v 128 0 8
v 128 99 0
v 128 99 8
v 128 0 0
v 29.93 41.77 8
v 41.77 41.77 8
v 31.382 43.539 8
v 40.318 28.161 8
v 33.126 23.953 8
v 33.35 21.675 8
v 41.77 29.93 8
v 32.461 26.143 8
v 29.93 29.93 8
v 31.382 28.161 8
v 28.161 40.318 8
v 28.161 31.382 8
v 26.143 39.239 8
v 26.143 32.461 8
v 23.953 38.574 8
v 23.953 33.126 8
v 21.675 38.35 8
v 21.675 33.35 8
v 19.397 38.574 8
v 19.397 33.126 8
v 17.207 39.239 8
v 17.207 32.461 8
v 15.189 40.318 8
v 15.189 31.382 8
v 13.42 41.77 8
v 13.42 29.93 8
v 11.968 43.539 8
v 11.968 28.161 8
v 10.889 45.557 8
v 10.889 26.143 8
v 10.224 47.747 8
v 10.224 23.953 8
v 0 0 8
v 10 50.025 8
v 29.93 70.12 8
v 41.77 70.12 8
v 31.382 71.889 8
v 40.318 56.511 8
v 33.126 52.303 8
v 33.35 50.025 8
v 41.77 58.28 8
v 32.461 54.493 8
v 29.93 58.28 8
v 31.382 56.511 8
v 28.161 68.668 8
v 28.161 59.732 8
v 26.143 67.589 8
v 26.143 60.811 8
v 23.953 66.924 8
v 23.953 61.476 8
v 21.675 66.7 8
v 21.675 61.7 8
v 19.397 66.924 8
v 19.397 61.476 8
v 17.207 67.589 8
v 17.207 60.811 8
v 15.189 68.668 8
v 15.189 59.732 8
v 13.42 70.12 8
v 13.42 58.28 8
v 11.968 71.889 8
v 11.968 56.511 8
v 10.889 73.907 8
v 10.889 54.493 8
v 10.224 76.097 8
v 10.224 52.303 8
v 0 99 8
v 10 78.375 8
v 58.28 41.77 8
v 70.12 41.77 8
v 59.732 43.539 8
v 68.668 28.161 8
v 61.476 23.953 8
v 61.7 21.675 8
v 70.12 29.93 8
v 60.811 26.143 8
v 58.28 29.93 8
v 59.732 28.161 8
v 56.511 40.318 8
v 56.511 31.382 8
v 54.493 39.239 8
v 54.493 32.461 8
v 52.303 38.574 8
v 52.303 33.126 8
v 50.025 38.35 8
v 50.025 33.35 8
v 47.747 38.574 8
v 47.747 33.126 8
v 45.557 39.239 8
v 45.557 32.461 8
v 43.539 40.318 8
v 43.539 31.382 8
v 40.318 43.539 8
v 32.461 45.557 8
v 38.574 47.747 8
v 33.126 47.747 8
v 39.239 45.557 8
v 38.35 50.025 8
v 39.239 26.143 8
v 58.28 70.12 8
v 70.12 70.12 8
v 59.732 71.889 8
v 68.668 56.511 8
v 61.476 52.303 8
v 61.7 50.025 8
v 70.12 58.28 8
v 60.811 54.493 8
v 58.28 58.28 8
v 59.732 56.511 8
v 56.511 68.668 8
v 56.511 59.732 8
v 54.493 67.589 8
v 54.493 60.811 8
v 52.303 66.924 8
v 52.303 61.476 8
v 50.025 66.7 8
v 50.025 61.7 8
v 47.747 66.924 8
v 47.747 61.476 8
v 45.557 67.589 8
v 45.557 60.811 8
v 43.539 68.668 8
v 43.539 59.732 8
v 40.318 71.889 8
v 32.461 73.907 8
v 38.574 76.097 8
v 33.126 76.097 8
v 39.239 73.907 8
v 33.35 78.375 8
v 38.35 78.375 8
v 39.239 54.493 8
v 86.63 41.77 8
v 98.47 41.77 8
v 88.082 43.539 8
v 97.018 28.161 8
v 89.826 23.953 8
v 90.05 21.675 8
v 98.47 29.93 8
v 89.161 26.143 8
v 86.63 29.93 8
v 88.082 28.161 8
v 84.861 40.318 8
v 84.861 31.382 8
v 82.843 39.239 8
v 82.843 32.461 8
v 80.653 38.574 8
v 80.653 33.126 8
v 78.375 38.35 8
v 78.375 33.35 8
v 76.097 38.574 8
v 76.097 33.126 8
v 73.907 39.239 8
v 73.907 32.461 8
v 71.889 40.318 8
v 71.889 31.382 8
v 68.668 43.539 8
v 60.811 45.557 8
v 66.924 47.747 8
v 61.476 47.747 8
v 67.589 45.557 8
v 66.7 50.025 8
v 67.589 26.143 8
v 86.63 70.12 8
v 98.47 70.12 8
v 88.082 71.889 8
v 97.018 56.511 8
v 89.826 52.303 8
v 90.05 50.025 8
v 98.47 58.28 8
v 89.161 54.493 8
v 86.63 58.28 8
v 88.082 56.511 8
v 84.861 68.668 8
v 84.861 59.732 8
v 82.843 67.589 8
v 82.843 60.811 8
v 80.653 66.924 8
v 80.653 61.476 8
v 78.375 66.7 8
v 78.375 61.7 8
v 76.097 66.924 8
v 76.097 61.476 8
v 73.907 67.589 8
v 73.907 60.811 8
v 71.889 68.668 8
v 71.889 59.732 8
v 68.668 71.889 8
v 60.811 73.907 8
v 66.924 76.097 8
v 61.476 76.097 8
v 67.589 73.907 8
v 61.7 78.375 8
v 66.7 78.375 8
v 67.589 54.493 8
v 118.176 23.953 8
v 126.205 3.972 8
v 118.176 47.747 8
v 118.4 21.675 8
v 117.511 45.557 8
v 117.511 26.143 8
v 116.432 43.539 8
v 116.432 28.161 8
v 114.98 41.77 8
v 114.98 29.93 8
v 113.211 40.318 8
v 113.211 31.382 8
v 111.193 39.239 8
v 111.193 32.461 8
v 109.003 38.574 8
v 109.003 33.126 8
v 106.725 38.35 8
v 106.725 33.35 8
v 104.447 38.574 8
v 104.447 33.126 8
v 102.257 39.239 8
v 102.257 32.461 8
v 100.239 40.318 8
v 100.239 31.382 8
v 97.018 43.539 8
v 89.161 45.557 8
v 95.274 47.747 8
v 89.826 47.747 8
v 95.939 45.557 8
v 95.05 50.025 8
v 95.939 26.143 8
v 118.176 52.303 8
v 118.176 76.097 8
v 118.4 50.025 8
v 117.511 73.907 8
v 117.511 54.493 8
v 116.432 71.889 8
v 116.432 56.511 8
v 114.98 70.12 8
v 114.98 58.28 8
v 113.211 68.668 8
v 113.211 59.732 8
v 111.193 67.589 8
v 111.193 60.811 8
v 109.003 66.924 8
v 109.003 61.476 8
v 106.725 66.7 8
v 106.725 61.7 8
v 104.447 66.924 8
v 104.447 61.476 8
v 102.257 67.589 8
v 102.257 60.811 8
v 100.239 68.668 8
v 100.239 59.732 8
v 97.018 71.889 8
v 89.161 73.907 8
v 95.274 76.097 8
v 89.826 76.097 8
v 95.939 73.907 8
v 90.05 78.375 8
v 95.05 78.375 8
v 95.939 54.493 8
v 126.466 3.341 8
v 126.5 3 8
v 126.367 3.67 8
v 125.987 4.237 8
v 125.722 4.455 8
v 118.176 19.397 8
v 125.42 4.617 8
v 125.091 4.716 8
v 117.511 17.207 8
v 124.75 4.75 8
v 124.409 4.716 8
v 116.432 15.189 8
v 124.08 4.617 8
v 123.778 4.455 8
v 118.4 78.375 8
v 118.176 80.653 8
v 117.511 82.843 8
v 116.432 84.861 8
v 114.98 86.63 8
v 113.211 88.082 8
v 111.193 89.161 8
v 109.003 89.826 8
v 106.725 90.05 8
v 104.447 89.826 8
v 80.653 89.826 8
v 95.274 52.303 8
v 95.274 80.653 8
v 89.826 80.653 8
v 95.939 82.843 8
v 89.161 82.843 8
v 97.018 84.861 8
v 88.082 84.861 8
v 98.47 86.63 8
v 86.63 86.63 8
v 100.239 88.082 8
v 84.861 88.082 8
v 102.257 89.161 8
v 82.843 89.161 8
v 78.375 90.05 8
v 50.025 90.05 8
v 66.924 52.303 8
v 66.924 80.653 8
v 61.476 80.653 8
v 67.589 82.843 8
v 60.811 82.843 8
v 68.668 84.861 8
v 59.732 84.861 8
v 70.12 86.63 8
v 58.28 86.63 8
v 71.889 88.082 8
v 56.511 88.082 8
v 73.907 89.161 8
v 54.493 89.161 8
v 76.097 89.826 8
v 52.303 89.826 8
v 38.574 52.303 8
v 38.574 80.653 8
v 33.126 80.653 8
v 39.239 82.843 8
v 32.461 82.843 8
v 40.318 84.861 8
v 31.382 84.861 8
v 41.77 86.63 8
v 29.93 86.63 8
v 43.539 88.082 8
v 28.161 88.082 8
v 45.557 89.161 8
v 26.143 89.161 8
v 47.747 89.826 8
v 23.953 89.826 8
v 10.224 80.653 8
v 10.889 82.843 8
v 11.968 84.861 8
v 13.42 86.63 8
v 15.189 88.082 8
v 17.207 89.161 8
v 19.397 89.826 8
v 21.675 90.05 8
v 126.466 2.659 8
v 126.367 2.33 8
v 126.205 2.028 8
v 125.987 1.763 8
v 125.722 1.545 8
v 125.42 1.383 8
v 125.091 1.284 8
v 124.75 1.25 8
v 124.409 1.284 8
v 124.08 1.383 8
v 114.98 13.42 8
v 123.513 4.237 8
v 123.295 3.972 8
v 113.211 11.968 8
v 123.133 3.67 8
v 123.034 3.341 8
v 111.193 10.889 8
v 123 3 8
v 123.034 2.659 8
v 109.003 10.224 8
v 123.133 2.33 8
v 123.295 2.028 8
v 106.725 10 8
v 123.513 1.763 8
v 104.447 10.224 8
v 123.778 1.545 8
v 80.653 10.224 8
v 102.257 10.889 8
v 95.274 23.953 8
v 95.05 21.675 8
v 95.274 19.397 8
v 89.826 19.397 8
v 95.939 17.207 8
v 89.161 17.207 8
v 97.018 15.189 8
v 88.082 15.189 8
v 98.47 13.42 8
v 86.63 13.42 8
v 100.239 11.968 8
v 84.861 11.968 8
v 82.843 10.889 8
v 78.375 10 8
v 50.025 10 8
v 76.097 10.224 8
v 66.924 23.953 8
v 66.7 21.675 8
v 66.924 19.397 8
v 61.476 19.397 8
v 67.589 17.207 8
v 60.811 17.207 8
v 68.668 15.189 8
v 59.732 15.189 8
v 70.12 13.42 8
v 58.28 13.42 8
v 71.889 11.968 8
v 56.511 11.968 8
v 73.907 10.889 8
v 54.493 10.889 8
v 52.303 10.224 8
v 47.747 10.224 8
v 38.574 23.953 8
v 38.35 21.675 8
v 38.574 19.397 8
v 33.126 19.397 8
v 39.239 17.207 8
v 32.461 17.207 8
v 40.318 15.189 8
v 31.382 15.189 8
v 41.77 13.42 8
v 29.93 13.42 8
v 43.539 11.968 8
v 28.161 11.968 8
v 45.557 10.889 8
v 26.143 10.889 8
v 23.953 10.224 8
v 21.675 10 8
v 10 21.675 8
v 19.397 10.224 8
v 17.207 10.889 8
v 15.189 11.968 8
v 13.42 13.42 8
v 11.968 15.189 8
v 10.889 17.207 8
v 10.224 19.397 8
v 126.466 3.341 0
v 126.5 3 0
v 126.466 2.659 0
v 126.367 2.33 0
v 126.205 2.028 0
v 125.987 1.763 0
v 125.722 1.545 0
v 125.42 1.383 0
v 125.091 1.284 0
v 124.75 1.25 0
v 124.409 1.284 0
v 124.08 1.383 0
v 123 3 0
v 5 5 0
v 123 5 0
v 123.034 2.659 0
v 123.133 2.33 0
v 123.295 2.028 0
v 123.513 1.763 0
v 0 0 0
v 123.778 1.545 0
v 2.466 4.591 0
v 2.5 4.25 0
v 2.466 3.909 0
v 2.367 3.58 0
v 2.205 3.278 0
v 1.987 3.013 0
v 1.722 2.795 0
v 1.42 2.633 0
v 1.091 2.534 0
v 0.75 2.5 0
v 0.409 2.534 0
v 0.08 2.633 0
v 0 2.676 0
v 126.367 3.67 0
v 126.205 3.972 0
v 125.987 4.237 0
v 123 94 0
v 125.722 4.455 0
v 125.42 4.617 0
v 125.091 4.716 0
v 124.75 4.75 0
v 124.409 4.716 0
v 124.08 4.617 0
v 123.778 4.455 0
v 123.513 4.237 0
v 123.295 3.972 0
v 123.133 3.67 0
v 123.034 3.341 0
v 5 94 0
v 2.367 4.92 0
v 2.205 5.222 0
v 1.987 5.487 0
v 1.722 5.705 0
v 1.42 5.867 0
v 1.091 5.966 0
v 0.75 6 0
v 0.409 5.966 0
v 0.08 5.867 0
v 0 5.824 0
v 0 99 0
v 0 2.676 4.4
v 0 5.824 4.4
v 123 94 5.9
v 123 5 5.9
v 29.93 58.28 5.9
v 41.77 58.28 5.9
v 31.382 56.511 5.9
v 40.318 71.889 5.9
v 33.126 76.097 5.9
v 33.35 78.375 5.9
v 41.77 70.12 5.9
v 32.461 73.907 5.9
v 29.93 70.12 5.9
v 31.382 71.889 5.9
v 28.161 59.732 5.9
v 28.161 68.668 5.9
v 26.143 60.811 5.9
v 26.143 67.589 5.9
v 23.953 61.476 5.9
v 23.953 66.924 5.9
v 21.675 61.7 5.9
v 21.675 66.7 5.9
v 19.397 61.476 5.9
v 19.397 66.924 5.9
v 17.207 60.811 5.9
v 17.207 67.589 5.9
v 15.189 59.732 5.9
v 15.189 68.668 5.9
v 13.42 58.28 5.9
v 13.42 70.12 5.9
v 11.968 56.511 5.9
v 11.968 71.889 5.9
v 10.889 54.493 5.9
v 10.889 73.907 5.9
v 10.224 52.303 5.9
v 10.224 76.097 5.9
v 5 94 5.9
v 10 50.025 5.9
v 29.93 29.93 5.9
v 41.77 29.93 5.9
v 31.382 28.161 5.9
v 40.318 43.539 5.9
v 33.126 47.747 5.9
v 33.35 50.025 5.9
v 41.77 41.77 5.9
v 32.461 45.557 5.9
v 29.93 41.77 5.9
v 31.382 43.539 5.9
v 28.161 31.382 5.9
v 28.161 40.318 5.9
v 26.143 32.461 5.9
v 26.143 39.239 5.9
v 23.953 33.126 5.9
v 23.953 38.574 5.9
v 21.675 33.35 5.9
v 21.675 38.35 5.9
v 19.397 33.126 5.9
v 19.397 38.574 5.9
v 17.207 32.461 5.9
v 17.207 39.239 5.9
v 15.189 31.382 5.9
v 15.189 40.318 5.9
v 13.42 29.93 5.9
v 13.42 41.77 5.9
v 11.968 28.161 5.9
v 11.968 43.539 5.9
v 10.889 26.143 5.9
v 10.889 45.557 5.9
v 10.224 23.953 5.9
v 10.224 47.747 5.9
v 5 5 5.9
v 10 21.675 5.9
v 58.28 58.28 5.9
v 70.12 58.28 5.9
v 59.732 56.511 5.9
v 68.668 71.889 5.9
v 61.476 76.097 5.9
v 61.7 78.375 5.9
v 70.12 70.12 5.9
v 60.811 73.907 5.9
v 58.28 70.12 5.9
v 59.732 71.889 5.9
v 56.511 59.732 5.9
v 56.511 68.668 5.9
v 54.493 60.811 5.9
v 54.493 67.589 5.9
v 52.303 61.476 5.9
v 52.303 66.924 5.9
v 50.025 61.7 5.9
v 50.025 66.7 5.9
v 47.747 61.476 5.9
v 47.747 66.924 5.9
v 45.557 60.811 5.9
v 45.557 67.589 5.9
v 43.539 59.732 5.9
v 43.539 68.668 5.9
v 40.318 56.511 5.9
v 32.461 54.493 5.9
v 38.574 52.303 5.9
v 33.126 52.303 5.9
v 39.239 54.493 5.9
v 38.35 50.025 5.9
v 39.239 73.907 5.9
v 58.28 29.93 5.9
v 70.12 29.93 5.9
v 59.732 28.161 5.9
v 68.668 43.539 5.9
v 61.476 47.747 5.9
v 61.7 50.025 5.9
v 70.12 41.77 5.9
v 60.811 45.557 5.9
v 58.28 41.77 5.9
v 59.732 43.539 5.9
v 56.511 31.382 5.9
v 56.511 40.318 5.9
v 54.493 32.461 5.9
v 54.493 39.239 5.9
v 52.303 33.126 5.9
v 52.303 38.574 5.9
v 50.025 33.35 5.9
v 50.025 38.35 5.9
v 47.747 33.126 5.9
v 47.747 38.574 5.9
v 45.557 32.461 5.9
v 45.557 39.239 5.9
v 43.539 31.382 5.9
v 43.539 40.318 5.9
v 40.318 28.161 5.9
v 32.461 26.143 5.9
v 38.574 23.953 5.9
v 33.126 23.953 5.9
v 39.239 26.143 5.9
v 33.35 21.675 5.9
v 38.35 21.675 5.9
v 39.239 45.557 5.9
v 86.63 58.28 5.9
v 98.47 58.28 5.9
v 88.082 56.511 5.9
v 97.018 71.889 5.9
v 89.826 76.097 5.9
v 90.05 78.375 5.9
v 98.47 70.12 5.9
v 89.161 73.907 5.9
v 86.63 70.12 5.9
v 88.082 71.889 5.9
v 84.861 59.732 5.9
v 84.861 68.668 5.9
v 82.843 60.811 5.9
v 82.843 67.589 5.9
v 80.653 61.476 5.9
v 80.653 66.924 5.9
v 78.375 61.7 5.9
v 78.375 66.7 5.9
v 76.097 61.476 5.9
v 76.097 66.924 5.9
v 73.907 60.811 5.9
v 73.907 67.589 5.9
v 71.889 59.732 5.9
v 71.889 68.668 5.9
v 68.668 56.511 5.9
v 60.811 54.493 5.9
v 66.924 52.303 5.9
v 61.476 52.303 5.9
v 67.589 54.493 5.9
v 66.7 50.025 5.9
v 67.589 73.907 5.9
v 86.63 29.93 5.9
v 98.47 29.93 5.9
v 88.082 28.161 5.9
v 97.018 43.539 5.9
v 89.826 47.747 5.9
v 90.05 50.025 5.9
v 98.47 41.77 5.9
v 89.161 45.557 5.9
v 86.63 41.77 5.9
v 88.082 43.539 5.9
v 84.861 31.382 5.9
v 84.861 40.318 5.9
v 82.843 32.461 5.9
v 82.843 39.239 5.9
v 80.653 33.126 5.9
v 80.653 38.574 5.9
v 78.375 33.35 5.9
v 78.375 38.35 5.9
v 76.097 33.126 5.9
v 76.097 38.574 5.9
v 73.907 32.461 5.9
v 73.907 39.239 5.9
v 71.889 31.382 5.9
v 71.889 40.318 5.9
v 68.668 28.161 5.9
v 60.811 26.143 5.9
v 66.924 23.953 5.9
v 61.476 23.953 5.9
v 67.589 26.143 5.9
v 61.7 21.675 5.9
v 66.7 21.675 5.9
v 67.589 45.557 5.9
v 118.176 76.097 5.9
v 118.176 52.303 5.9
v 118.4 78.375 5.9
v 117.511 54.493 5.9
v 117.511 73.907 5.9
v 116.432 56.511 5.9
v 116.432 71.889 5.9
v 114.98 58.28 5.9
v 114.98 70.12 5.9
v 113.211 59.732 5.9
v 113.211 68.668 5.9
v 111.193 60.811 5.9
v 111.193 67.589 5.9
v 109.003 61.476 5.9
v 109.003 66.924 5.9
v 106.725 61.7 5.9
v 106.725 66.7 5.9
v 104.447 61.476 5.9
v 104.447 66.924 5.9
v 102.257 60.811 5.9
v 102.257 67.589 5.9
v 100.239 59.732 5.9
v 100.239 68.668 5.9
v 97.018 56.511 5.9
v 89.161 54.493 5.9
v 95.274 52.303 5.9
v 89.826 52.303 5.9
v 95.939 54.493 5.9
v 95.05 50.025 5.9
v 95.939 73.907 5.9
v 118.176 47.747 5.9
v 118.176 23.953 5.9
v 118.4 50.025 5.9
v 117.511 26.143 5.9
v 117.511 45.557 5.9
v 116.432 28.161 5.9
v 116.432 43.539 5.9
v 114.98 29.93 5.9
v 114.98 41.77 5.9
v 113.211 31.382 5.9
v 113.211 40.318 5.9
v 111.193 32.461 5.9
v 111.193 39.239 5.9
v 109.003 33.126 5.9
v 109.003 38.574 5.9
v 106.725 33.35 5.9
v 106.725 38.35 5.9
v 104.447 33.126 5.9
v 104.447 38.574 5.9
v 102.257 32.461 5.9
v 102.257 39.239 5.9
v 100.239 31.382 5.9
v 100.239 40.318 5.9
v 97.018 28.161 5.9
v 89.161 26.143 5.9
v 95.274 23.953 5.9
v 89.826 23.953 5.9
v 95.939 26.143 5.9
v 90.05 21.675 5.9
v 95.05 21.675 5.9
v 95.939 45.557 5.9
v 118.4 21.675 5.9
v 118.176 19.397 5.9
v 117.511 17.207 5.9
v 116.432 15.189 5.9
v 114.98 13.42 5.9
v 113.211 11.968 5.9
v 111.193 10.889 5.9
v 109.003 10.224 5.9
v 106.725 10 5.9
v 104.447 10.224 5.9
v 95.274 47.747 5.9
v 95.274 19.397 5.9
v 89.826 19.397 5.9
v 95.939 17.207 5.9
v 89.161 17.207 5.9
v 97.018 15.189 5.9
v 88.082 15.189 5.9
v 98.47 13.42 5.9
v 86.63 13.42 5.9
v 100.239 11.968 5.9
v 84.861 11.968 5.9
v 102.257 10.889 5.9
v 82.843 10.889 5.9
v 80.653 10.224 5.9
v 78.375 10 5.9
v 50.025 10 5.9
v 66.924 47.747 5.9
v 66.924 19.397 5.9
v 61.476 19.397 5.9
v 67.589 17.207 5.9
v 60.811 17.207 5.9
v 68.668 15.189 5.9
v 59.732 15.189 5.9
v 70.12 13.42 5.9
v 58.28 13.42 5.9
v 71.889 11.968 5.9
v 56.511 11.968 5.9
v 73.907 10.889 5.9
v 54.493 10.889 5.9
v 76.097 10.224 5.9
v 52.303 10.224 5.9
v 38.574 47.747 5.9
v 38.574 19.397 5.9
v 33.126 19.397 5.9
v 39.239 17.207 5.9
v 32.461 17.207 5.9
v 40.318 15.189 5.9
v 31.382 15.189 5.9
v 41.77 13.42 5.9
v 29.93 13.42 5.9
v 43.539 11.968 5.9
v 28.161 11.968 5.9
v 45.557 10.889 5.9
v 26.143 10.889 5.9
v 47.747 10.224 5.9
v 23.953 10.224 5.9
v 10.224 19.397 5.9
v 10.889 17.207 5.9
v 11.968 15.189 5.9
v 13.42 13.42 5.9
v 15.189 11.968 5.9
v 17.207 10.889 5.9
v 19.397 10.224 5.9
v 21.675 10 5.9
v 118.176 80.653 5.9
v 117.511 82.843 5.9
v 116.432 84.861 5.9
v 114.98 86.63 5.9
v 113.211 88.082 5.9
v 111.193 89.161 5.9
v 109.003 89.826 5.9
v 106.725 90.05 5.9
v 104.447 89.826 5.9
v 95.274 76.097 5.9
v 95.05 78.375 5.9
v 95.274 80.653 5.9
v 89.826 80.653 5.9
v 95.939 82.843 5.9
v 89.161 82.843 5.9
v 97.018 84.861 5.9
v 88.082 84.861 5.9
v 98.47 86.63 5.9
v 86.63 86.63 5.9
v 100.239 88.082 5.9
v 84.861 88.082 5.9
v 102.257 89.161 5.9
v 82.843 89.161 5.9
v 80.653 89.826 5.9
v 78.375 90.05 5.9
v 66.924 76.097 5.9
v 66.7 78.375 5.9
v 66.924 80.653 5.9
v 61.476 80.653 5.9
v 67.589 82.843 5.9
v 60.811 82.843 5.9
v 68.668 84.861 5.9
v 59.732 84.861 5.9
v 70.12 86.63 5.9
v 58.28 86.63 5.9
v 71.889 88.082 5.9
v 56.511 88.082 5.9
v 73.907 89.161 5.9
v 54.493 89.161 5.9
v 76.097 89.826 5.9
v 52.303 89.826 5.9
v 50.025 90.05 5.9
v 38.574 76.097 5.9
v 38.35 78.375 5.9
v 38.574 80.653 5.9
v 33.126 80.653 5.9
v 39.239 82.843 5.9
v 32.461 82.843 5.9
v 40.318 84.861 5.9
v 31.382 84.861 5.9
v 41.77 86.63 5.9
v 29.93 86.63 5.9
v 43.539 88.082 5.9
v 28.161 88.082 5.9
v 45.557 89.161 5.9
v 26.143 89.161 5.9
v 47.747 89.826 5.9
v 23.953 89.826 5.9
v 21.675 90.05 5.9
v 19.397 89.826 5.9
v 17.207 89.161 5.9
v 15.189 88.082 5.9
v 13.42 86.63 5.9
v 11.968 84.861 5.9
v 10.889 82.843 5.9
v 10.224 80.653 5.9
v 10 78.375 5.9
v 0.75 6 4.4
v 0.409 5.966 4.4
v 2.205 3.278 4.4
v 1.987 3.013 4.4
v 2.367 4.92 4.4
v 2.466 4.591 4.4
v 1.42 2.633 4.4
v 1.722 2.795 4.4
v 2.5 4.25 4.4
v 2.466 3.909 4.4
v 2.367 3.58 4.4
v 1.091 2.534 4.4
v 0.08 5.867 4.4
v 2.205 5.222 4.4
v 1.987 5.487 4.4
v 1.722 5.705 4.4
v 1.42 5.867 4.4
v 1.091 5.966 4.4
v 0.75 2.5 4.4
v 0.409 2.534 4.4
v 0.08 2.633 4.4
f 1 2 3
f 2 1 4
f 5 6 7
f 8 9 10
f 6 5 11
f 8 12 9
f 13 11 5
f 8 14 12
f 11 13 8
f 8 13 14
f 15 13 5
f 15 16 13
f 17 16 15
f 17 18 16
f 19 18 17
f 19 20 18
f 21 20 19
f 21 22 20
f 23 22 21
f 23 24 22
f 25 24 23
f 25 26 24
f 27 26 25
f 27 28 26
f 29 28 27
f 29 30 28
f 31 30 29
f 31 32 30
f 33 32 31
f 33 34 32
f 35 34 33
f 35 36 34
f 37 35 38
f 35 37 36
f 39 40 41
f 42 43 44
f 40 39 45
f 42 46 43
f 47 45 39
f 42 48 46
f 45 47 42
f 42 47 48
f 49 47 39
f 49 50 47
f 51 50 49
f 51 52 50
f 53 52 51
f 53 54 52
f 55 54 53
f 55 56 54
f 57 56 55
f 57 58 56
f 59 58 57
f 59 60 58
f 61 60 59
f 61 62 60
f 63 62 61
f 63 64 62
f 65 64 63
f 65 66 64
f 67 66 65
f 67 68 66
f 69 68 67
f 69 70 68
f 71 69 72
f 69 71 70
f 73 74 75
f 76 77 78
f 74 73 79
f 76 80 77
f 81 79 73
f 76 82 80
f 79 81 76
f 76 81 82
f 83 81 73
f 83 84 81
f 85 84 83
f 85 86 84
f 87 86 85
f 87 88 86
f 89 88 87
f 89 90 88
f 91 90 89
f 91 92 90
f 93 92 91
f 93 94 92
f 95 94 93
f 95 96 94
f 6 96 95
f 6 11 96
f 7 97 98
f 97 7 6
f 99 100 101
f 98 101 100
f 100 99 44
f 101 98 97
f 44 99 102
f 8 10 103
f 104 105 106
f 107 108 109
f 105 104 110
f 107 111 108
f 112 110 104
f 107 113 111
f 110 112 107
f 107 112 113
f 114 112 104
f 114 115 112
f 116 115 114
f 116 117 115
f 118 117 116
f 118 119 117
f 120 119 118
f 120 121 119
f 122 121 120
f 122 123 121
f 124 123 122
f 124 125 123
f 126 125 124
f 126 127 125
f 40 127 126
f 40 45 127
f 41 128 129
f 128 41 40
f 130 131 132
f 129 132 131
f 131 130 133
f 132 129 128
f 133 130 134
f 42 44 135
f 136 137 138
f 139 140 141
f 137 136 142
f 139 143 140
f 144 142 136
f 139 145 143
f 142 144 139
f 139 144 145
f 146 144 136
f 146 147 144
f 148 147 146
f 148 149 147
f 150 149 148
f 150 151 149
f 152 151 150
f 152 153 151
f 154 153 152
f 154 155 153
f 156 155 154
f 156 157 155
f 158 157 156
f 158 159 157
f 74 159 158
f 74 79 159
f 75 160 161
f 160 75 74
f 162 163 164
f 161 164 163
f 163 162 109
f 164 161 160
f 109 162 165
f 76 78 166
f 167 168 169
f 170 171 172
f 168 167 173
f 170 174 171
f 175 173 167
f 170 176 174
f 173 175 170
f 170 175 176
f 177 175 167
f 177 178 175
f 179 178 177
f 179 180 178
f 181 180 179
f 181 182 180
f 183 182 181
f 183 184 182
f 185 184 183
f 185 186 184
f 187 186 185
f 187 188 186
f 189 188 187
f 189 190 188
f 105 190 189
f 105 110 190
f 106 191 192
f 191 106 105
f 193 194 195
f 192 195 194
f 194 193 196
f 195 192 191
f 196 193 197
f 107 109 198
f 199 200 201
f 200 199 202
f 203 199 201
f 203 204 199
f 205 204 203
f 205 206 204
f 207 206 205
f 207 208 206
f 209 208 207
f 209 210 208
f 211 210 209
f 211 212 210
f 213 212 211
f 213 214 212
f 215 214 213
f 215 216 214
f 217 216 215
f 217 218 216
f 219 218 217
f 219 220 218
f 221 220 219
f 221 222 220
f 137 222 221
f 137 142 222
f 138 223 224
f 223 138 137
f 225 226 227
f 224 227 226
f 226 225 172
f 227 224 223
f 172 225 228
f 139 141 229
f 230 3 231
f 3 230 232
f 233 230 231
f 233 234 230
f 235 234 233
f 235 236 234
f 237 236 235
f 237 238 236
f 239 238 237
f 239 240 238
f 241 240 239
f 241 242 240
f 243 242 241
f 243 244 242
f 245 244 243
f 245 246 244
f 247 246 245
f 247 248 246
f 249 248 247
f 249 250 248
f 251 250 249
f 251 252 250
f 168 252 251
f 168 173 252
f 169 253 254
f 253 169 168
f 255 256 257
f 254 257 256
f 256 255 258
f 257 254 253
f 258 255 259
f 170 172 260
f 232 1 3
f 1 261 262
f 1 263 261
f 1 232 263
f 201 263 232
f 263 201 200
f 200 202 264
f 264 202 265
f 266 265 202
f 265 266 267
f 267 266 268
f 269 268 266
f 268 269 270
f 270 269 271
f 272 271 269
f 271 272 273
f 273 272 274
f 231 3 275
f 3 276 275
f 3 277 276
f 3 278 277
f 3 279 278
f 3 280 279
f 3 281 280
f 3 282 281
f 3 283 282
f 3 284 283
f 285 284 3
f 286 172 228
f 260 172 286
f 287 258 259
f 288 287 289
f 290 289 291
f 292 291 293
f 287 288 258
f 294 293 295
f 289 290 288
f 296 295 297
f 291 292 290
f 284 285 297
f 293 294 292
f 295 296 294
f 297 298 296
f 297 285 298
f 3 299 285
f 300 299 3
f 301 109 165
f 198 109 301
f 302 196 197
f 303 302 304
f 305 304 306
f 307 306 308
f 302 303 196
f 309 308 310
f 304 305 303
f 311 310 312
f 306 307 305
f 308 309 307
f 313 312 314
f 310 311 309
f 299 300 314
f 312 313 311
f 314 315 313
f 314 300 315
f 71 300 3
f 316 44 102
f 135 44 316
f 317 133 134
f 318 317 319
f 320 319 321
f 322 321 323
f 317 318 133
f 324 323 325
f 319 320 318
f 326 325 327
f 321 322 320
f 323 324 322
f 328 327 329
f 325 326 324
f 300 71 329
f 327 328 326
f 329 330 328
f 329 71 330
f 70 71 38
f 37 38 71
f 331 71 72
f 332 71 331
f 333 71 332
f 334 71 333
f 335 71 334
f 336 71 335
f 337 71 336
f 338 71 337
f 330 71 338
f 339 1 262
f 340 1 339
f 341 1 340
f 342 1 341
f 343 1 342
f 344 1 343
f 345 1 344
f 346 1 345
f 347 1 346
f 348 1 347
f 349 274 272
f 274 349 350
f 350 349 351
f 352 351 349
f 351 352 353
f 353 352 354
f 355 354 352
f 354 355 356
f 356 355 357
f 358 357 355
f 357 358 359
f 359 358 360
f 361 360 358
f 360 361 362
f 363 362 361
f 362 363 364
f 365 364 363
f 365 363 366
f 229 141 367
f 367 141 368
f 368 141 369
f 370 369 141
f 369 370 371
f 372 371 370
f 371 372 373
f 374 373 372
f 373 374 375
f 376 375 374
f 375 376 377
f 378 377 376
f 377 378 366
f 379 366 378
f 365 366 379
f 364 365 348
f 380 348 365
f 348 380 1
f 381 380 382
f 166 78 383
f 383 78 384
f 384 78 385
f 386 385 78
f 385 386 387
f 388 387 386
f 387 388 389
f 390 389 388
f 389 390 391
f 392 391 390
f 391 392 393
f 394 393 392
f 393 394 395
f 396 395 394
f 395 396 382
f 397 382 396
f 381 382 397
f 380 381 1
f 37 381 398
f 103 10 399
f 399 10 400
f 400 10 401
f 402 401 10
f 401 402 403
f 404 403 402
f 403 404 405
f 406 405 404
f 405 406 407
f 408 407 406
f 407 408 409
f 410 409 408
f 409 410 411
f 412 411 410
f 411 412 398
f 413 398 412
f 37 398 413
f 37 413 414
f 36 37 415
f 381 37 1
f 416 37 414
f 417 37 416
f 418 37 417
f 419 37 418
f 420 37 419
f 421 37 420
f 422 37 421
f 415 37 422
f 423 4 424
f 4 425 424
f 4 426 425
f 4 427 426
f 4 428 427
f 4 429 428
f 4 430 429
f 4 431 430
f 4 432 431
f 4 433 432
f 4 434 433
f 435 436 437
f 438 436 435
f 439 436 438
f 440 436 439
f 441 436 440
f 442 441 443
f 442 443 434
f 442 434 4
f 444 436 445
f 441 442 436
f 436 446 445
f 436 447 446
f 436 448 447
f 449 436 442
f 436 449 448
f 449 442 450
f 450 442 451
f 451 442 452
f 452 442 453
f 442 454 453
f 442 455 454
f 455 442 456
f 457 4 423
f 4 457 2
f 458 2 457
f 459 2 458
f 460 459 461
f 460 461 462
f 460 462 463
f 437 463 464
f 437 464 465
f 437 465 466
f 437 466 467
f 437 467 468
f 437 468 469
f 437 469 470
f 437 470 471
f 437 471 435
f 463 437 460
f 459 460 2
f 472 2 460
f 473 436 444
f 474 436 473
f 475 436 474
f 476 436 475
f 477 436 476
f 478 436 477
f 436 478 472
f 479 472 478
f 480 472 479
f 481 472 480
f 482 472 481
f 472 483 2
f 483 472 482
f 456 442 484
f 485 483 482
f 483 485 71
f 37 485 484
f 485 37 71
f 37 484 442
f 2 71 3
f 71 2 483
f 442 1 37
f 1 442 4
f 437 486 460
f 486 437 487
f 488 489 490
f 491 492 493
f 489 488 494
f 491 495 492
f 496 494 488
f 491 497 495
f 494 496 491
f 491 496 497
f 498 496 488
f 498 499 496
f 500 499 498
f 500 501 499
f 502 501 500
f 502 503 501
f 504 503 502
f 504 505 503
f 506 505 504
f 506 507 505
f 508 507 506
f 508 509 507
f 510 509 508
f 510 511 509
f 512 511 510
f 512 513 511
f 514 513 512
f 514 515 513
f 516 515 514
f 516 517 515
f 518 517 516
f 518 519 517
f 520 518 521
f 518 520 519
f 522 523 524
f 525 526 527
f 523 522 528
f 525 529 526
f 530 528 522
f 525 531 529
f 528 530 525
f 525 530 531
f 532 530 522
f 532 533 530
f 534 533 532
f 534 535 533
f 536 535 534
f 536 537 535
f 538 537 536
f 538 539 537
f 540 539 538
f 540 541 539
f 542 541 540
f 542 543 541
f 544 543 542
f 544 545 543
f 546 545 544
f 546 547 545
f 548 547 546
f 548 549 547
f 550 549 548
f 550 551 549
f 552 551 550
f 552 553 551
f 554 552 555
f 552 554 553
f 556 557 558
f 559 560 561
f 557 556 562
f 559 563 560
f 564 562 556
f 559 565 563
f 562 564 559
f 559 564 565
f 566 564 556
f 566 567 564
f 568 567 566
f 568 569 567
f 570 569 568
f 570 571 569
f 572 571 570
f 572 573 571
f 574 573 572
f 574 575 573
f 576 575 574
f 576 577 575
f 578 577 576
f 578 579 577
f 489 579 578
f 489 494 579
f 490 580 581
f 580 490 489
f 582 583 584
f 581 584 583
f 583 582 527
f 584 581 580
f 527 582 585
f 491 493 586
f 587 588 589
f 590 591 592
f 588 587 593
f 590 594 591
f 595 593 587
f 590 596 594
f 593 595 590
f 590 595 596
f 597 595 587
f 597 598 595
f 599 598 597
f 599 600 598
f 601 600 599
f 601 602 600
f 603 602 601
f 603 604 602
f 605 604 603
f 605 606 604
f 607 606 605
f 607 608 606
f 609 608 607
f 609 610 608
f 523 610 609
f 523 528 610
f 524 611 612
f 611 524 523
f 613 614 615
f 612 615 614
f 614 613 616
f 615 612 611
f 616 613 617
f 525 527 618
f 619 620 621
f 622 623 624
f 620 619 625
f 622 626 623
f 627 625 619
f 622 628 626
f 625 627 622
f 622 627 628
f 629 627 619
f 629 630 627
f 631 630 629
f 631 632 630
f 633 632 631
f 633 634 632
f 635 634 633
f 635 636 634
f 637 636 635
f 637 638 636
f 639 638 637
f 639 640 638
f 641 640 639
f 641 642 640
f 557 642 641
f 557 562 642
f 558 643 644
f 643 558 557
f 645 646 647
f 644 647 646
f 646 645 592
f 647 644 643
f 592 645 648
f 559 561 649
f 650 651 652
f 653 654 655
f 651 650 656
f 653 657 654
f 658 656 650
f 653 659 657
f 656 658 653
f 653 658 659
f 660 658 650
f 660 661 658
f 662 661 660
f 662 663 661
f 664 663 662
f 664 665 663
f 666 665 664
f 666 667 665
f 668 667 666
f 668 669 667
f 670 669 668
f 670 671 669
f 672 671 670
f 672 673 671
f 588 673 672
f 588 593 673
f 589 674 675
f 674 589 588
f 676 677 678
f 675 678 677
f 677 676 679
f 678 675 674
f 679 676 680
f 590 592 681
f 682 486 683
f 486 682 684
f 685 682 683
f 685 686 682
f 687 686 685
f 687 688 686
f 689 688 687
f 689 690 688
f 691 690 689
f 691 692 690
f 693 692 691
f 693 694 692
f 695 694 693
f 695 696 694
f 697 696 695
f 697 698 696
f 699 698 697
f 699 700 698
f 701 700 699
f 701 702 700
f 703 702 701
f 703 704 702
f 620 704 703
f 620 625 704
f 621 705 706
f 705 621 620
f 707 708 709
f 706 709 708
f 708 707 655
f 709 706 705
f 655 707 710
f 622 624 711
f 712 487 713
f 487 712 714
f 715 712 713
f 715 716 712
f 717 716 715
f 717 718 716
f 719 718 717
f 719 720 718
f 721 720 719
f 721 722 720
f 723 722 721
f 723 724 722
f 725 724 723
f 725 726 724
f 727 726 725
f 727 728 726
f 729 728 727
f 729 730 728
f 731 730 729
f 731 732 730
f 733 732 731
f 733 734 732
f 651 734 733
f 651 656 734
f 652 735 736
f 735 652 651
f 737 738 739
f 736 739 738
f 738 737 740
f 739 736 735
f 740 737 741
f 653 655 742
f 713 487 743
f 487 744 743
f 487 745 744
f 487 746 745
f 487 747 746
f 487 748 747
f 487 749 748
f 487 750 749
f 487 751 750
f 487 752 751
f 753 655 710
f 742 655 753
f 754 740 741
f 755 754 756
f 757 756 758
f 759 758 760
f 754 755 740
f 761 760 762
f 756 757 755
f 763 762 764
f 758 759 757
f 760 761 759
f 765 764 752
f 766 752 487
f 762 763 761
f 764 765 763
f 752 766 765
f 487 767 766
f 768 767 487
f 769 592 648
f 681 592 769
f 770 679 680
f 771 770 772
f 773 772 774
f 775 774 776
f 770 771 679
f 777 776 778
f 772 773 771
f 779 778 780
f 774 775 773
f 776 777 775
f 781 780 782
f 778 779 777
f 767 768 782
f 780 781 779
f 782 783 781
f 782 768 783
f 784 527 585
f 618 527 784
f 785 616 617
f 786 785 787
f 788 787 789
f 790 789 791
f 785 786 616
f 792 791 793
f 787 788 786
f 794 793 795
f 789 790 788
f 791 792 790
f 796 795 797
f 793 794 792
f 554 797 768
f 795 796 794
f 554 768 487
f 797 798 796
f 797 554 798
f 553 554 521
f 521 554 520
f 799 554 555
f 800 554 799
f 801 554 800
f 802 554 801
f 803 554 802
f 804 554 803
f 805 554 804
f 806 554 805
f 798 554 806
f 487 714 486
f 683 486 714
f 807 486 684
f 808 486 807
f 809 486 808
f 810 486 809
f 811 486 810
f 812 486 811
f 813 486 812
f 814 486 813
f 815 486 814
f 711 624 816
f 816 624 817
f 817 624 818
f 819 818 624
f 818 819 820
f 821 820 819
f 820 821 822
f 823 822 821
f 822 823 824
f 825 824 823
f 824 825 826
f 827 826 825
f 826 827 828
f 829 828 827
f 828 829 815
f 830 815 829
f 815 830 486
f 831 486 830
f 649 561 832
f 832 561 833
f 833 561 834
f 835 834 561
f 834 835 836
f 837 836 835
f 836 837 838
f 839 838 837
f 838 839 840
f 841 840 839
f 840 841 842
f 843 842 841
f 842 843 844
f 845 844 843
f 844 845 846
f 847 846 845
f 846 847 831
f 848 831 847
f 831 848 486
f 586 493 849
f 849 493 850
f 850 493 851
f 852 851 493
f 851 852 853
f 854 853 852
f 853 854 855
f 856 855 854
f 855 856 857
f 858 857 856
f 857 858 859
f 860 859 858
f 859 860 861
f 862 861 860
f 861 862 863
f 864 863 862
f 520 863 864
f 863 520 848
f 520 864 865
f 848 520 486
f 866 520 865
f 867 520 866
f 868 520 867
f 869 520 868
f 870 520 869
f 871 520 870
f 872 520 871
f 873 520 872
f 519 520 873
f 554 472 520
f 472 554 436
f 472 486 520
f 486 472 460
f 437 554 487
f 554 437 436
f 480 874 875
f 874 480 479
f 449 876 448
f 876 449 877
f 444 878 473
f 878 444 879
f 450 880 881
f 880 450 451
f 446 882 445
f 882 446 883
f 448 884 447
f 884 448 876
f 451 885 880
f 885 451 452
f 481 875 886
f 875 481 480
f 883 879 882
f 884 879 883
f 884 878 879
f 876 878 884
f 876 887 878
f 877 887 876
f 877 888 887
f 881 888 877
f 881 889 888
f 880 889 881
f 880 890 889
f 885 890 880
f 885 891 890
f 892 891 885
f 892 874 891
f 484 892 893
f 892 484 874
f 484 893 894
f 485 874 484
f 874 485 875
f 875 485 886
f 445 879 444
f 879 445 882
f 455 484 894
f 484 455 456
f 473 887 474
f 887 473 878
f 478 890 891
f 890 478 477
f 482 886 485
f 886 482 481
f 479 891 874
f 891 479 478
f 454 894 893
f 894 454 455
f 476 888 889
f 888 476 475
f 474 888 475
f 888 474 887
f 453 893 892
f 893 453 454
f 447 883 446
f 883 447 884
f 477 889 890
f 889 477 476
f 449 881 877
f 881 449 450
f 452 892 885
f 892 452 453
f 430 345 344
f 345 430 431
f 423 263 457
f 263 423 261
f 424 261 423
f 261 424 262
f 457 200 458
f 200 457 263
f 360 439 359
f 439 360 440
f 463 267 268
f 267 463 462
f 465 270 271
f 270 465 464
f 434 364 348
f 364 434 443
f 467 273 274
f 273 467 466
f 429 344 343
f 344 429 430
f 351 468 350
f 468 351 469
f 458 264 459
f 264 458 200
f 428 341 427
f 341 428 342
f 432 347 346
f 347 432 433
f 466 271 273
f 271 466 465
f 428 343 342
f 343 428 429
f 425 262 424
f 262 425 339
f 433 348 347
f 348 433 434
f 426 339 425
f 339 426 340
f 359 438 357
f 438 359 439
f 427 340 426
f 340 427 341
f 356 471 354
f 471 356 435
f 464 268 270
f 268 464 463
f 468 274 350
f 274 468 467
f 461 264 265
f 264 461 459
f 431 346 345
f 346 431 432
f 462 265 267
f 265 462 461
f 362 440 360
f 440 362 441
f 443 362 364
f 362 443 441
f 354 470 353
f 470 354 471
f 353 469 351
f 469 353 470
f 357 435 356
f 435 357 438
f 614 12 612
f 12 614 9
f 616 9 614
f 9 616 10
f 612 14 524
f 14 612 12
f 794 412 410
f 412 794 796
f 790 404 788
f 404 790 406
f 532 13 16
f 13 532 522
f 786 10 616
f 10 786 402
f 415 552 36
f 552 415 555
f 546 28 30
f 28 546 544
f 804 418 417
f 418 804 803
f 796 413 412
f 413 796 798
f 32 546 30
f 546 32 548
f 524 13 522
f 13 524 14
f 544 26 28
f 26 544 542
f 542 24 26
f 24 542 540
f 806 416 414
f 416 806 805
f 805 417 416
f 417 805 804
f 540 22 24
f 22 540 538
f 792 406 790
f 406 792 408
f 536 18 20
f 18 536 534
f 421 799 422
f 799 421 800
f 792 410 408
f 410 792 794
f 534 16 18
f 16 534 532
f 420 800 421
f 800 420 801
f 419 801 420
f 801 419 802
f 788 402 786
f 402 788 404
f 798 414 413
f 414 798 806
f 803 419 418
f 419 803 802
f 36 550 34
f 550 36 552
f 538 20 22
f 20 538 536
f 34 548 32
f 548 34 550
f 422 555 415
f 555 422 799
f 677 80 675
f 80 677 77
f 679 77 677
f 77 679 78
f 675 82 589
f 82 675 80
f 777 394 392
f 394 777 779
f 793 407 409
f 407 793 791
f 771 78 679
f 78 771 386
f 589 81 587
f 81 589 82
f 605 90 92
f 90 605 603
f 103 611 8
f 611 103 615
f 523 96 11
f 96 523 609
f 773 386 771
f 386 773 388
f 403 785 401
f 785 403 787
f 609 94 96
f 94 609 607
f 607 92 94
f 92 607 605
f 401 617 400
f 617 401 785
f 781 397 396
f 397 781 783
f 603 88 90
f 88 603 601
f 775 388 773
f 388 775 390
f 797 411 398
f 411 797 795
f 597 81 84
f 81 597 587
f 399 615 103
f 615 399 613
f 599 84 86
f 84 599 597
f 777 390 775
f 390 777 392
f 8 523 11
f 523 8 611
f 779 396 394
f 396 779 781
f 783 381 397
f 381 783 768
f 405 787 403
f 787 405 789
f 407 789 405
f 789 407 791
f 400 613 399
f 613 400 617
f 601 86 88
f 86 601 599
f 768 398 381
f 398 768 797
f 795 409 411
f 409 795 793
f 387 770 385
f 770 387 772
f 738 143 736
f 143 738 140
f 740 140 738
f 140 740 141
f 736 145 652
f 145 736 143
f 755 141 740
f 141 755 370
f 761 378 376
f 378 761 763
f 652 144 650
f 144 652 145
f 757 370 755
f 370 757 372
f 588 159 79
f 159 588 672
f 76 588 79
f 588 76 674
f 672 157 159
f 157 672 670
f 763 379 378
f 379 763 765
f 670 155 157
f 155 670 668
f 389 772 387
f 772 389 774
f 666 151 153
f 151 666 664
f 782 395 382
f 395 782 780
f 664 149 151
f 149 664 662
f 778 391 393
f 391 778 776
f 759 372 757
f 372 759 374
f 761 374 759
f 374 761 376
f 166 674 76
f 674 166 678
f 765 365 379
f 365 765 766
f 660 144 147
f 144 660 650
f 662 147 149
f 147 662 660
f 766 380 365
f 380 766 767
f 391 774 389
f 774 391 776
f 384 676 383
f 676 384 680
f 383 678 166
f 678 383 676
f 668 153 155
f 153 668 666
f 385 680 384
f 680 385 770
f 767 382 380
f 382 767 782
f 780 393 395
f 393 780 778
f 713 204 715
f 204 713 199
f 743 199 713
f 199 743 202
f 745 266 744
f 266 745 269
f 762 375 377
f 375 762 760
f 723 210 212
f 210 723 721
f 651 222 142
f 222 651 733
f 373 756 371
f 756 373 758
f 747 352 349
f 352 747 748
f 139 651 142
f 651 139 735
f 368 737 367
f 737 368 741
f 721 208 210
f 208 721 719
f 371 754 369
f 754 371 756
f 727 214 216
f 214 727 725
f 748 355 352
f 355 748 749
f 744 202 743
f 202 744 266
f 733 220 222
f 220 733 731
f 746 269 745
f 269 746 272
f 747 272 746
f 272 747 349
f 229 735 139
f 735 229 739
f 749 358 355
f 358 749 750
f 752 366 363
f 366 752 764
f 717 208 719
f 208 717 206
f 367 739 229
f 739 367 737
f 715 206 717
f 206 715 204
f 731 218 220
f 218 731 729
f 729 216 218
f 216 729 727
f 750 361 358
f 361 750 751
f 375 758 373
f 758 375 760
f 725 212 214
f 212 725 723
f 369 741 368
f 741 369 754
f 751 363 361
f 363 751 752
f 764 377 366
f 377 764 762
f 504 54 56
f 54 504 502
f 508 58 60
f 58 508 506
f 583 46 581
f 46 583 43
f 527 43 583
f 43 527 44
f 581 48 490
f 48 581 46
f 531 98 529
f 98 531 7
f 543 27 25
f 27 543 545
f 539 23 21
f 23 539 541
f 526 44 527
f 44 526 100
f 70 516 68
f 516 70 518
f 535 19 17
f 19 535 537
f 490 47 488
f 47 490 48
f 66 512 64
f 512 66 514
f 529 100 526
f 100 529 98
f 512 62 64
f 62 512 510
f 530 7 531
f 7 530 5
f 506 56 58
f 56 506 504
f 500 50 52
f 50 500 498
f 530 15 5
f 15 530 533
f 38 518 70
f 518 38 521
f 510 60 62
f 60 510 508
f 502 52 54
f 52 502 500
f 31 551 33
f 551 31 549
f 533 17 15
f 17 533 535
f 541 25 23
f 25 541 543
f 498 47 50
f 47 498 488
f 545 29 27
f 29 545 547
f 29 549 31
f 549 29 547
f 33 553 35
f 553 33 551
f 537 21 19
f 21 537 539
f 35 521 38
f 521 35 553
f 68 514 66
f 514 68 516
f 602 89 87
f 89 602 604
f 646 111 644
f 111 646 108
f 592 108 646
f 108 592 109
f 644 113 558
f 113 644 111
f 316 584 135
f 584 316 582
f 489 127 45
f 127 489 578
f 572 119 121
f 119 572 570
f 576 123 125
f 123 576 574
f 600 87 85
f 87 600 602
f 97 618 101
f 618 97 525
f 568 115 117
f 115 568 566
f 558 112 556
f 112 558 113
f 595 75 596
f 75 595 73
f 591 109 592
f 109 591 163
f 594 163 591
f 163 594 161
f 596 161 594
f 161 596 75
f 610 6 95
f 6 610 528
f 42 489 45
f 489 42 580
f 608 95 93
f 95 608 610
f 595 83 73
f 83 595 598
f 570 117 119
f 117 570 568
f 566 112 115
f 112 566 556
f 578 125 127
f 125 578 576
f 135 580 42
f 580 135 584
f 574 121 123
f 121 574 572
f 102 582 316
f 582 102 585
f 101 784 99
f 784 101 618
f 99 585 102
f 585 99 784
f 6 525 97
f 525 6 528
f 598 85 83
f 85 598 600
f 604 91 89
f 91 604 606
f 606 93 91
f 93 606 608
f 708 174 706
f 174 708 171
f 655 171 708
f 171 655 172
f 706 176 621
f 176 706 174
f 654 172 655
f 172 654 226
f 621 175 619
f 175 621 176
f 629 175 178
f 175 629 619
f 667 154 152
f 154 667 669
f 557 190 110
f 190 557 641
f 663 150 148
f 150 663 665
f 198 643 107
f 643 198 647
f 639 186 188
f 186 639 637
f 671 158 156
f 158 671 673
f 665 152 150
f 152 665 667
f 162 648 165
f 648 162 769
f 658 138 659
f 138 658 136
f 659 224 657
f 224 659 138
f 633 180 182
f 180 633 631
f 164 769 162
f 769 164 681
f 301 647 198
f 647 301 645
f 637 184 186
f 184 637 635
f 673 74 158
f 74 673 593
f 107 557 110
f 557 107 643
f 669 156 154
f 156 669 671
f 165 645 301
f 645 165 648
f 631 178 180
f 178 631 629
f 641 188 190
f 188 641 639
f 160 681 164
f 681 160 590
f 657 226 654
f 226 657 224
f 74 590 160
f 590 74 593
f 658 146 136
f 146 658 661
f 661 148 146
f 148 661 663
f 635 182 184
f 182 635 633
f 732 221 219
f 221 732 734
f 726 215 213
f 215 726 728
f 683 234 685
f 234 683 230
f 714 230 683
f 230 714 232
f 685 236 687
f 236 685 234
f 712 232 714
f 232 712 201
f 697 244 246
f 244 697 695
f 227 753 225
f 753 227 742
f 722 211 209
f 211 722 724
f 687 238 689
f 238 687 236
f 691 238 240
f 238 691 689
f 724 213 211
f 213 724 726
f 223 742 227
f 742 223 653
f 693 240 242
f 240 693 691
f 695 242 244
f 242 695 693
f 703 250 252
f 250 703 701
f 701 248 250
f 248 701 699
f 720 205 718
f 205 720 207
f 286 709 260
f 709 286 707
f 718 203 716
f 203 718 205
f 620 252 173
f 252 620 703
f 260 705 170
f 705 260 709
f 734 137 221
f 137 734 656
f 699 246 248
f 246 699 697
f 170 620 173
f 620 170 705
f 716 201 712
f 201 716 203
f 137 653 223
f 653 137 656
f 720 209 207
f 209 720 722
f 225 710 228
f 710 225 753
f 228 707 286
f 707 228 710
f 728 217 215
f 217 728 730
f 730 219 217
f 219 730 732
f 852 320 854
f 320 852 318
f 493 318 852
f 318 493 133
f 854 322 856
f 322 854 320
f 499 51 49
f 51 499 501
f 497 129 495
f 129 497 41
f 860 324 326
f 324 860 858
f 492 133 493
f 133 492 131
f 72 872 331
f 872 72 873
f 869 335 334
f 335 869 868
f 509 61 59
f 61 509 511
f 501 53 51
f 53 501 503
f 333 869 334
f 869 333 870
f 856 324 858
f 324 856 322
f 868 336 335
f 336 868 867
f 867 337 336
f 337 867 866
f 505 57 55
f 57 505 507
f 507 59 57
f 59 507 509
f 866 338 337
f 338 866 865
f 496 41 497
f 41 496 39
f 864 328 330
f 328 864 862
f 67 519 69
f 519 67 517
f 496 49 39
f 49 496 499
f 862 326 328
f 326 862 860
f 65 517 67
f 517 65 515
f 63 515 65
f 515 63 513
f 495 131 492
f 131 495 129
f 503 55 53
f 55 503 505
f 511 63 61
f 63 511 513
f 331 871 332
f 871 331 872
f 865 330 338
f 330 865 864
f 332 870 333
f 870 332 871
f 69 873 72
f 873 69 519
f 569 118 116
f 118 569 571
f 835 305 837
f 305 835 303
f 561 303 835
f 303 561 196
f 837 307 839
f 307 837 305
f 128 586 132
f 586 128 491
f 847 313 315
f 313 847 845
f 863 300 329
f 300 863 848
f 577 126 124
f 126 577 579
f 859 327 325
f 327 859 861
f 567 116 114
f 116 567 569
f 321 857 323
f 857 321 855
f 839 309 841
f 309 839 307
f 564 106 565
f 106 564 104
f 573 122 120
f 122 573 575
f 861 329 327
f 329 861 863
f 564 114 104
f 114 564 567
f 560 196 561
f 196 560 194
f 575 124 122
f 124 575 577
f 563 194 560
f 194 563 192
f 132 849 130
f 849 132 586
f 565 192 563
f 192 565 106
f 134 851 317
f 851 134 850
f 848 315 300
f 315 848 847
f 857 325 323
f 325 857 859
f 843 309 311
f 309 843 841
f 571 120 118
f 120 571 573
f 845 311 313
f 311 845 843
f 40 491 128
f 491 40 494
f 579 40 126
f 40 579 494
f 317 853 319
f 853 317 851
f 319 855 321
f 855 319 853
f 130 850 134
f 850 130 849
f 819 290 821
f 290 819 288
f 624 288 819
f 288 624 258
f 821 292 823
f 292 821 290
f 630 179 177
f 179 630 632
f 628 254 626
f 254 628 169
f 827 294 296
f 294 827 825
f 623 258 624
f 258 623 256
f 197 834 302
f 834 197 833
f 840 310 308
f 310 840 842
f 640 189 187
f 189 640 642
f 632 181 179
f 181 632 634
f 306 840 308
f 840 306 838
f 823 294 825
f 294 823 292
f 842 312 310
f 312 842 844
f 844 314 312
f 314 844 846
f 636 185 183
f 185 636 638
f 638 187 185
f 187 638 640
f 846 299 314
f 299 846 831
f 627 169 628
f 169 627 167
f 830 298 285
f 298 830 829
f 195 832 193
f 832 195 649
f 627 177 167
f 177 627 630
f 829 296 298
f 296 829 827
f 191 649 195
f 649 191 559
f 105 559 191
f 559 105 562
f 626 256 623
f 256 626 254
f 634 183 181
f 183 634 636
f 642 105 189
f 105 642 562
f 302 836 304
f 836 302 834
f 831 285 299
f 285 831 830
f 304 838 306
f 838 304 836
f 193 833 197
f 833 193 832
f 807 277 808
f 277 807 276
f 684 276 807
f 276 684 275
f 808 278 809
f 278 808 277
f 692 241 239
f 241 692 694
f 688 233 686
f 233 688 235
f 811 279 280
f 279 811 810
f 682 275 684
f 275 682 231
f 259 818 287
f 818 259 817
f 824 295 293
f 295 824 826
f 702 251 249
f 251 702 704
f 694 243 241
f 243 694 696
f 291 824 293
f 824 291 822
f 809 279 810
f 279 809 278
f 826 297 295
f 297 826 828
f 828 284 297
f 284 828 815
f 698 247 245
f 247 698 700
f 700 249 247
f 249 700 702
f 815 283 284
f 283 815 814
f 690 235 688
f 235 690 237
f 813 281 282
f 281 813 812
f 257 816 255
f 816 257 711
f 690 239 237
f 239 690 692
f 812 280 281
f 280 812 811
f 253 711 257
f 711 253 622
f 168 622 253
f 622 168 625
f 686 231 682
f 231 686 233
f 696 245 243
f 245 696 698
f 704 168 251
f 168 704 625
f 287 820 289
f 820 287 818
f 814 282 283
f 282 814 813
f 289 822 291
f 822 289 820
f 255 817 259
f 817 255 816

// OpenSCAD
$fn = 32;

panel_w = 118.0;
panel_h = 89.0;
panel_d = 6.0;

bezel_w = 5;
overall_d = 8;

insert_hole_d = 3.5;

bighole_d =  (panel_w - bezel_w / 4) / 5;

difference() {
    cube([panel_w+bezel_w*2, panel_h+bezel_w*2, overall_d]);
    translate([bezel_w, bezel_w, -0.1])
      cube([panel_w, panel_h, panel_d]);
  
  translate([2.5-1.75, bezel_w/2 + insert_hole_d/2, -0.1])
    cylinder(h = overall_d + 1, r = insert_hole_d / 2, center = true);
  
  translate([panel_w  + bezel_w + insert_hole_d/2,(bezel_w/2 + insert_hole_d)/2, -0.1])
    cylinder(h = overall_d + 1, r = insert_hole_d / 2);  
  
  // save some plastic...
  translate([bezel_w * 2 + bighole_d / 2, bezel_w * 2 + bighole_d / 2, 0.1])
    cylinder(h = 10, , r = bighole_d / 2);

  translate([bezel_w * 2 + bighole_d / 2, bezel_w * 2 + bighole_d / 2, 0.1])
    cylinder(h = 10, , r = bighole_d / 2);

  translate([bezel_w * 3 + bighole_d +  bighole_d / 2, bezel_w * 2 + bighole_d / 2, 0.1])
    cylinder(h = 10, , r = bighole_d / 2);

  translate([bezel_w * 4 + bighole_d* 2 +  bighole_d / 2, bezel_w * 2 + bighole_d / 2, 0.1])
    cylinder(h = 10, , r = bighole_d / 2);

  translate([bezel_w * 5 + bighole_d* 3 +  bighole_d / 2, bezel_w * 2 + bighole_d / 2, 0.1])
    cylinder(h = 10, , r = bighole_d / 2);
    
  translate([bezel_w * 2 + bighole_d / 2, bezel_w * 3 + bighole_d + bighole_d / 2, 0.1])
    cylinder(h = 10, , r = bighole_d / 2);

  translate([bezel_w * 3 + bighole_d +  bighole_d / 2, bezel_w * 3 + bighole_d + bighole_d / 2, 0.1])
    cylinder(h = 10, , r = bighole_d / 2);

  translate([bezel_w * 4 + bighole_d* 2 +  bighole_d / 2, bezel_w * 3 + bighole_d + bighole_d / 2, 0.1])
    cylinder(h = 10, , r = bighole_d / 2);

  translate([bezel_w * 5 + bighole_d* 3 +  bighole_d / 2, bezel_w * 3 + bighole_d + bighole_d / 2, 0.1])
    cylinder(h = 10, , r = bighole_d / 2);
    
  translate([bezel_w * 2 + bighole_d / 2, bezel_w * 4 + bighole_d * 2 + bighole_d / 2, 0.1])
    cylinder(h = 10, , r = bighole_d / 2);

  translate([bezel_w * 3 + bighole_d +  bighole_d / 2, bezel_w * 4 + bighole_d * 2+ bighole_d / 2, 0.1])
    cylinder(h = 10, , r = bighole_d / 2);

  translate([bezel_w * 4 + bighole_d* 2 +  bighole_d / 2, bezel_w * 4 + bighole_d * 2+ bighole_d / 2, 0.1])
    cylinder(h = 10, , r = bighole_d / 2);

  translate([bezel_w * 5 + bighole_d* 3 +  bighole_d / 2, bezel_w * 4 + bighole_d * 2+ bighole_d / 2, 0.1])
    cylinder(h = 10, , r = bighole_d / 2);
}
